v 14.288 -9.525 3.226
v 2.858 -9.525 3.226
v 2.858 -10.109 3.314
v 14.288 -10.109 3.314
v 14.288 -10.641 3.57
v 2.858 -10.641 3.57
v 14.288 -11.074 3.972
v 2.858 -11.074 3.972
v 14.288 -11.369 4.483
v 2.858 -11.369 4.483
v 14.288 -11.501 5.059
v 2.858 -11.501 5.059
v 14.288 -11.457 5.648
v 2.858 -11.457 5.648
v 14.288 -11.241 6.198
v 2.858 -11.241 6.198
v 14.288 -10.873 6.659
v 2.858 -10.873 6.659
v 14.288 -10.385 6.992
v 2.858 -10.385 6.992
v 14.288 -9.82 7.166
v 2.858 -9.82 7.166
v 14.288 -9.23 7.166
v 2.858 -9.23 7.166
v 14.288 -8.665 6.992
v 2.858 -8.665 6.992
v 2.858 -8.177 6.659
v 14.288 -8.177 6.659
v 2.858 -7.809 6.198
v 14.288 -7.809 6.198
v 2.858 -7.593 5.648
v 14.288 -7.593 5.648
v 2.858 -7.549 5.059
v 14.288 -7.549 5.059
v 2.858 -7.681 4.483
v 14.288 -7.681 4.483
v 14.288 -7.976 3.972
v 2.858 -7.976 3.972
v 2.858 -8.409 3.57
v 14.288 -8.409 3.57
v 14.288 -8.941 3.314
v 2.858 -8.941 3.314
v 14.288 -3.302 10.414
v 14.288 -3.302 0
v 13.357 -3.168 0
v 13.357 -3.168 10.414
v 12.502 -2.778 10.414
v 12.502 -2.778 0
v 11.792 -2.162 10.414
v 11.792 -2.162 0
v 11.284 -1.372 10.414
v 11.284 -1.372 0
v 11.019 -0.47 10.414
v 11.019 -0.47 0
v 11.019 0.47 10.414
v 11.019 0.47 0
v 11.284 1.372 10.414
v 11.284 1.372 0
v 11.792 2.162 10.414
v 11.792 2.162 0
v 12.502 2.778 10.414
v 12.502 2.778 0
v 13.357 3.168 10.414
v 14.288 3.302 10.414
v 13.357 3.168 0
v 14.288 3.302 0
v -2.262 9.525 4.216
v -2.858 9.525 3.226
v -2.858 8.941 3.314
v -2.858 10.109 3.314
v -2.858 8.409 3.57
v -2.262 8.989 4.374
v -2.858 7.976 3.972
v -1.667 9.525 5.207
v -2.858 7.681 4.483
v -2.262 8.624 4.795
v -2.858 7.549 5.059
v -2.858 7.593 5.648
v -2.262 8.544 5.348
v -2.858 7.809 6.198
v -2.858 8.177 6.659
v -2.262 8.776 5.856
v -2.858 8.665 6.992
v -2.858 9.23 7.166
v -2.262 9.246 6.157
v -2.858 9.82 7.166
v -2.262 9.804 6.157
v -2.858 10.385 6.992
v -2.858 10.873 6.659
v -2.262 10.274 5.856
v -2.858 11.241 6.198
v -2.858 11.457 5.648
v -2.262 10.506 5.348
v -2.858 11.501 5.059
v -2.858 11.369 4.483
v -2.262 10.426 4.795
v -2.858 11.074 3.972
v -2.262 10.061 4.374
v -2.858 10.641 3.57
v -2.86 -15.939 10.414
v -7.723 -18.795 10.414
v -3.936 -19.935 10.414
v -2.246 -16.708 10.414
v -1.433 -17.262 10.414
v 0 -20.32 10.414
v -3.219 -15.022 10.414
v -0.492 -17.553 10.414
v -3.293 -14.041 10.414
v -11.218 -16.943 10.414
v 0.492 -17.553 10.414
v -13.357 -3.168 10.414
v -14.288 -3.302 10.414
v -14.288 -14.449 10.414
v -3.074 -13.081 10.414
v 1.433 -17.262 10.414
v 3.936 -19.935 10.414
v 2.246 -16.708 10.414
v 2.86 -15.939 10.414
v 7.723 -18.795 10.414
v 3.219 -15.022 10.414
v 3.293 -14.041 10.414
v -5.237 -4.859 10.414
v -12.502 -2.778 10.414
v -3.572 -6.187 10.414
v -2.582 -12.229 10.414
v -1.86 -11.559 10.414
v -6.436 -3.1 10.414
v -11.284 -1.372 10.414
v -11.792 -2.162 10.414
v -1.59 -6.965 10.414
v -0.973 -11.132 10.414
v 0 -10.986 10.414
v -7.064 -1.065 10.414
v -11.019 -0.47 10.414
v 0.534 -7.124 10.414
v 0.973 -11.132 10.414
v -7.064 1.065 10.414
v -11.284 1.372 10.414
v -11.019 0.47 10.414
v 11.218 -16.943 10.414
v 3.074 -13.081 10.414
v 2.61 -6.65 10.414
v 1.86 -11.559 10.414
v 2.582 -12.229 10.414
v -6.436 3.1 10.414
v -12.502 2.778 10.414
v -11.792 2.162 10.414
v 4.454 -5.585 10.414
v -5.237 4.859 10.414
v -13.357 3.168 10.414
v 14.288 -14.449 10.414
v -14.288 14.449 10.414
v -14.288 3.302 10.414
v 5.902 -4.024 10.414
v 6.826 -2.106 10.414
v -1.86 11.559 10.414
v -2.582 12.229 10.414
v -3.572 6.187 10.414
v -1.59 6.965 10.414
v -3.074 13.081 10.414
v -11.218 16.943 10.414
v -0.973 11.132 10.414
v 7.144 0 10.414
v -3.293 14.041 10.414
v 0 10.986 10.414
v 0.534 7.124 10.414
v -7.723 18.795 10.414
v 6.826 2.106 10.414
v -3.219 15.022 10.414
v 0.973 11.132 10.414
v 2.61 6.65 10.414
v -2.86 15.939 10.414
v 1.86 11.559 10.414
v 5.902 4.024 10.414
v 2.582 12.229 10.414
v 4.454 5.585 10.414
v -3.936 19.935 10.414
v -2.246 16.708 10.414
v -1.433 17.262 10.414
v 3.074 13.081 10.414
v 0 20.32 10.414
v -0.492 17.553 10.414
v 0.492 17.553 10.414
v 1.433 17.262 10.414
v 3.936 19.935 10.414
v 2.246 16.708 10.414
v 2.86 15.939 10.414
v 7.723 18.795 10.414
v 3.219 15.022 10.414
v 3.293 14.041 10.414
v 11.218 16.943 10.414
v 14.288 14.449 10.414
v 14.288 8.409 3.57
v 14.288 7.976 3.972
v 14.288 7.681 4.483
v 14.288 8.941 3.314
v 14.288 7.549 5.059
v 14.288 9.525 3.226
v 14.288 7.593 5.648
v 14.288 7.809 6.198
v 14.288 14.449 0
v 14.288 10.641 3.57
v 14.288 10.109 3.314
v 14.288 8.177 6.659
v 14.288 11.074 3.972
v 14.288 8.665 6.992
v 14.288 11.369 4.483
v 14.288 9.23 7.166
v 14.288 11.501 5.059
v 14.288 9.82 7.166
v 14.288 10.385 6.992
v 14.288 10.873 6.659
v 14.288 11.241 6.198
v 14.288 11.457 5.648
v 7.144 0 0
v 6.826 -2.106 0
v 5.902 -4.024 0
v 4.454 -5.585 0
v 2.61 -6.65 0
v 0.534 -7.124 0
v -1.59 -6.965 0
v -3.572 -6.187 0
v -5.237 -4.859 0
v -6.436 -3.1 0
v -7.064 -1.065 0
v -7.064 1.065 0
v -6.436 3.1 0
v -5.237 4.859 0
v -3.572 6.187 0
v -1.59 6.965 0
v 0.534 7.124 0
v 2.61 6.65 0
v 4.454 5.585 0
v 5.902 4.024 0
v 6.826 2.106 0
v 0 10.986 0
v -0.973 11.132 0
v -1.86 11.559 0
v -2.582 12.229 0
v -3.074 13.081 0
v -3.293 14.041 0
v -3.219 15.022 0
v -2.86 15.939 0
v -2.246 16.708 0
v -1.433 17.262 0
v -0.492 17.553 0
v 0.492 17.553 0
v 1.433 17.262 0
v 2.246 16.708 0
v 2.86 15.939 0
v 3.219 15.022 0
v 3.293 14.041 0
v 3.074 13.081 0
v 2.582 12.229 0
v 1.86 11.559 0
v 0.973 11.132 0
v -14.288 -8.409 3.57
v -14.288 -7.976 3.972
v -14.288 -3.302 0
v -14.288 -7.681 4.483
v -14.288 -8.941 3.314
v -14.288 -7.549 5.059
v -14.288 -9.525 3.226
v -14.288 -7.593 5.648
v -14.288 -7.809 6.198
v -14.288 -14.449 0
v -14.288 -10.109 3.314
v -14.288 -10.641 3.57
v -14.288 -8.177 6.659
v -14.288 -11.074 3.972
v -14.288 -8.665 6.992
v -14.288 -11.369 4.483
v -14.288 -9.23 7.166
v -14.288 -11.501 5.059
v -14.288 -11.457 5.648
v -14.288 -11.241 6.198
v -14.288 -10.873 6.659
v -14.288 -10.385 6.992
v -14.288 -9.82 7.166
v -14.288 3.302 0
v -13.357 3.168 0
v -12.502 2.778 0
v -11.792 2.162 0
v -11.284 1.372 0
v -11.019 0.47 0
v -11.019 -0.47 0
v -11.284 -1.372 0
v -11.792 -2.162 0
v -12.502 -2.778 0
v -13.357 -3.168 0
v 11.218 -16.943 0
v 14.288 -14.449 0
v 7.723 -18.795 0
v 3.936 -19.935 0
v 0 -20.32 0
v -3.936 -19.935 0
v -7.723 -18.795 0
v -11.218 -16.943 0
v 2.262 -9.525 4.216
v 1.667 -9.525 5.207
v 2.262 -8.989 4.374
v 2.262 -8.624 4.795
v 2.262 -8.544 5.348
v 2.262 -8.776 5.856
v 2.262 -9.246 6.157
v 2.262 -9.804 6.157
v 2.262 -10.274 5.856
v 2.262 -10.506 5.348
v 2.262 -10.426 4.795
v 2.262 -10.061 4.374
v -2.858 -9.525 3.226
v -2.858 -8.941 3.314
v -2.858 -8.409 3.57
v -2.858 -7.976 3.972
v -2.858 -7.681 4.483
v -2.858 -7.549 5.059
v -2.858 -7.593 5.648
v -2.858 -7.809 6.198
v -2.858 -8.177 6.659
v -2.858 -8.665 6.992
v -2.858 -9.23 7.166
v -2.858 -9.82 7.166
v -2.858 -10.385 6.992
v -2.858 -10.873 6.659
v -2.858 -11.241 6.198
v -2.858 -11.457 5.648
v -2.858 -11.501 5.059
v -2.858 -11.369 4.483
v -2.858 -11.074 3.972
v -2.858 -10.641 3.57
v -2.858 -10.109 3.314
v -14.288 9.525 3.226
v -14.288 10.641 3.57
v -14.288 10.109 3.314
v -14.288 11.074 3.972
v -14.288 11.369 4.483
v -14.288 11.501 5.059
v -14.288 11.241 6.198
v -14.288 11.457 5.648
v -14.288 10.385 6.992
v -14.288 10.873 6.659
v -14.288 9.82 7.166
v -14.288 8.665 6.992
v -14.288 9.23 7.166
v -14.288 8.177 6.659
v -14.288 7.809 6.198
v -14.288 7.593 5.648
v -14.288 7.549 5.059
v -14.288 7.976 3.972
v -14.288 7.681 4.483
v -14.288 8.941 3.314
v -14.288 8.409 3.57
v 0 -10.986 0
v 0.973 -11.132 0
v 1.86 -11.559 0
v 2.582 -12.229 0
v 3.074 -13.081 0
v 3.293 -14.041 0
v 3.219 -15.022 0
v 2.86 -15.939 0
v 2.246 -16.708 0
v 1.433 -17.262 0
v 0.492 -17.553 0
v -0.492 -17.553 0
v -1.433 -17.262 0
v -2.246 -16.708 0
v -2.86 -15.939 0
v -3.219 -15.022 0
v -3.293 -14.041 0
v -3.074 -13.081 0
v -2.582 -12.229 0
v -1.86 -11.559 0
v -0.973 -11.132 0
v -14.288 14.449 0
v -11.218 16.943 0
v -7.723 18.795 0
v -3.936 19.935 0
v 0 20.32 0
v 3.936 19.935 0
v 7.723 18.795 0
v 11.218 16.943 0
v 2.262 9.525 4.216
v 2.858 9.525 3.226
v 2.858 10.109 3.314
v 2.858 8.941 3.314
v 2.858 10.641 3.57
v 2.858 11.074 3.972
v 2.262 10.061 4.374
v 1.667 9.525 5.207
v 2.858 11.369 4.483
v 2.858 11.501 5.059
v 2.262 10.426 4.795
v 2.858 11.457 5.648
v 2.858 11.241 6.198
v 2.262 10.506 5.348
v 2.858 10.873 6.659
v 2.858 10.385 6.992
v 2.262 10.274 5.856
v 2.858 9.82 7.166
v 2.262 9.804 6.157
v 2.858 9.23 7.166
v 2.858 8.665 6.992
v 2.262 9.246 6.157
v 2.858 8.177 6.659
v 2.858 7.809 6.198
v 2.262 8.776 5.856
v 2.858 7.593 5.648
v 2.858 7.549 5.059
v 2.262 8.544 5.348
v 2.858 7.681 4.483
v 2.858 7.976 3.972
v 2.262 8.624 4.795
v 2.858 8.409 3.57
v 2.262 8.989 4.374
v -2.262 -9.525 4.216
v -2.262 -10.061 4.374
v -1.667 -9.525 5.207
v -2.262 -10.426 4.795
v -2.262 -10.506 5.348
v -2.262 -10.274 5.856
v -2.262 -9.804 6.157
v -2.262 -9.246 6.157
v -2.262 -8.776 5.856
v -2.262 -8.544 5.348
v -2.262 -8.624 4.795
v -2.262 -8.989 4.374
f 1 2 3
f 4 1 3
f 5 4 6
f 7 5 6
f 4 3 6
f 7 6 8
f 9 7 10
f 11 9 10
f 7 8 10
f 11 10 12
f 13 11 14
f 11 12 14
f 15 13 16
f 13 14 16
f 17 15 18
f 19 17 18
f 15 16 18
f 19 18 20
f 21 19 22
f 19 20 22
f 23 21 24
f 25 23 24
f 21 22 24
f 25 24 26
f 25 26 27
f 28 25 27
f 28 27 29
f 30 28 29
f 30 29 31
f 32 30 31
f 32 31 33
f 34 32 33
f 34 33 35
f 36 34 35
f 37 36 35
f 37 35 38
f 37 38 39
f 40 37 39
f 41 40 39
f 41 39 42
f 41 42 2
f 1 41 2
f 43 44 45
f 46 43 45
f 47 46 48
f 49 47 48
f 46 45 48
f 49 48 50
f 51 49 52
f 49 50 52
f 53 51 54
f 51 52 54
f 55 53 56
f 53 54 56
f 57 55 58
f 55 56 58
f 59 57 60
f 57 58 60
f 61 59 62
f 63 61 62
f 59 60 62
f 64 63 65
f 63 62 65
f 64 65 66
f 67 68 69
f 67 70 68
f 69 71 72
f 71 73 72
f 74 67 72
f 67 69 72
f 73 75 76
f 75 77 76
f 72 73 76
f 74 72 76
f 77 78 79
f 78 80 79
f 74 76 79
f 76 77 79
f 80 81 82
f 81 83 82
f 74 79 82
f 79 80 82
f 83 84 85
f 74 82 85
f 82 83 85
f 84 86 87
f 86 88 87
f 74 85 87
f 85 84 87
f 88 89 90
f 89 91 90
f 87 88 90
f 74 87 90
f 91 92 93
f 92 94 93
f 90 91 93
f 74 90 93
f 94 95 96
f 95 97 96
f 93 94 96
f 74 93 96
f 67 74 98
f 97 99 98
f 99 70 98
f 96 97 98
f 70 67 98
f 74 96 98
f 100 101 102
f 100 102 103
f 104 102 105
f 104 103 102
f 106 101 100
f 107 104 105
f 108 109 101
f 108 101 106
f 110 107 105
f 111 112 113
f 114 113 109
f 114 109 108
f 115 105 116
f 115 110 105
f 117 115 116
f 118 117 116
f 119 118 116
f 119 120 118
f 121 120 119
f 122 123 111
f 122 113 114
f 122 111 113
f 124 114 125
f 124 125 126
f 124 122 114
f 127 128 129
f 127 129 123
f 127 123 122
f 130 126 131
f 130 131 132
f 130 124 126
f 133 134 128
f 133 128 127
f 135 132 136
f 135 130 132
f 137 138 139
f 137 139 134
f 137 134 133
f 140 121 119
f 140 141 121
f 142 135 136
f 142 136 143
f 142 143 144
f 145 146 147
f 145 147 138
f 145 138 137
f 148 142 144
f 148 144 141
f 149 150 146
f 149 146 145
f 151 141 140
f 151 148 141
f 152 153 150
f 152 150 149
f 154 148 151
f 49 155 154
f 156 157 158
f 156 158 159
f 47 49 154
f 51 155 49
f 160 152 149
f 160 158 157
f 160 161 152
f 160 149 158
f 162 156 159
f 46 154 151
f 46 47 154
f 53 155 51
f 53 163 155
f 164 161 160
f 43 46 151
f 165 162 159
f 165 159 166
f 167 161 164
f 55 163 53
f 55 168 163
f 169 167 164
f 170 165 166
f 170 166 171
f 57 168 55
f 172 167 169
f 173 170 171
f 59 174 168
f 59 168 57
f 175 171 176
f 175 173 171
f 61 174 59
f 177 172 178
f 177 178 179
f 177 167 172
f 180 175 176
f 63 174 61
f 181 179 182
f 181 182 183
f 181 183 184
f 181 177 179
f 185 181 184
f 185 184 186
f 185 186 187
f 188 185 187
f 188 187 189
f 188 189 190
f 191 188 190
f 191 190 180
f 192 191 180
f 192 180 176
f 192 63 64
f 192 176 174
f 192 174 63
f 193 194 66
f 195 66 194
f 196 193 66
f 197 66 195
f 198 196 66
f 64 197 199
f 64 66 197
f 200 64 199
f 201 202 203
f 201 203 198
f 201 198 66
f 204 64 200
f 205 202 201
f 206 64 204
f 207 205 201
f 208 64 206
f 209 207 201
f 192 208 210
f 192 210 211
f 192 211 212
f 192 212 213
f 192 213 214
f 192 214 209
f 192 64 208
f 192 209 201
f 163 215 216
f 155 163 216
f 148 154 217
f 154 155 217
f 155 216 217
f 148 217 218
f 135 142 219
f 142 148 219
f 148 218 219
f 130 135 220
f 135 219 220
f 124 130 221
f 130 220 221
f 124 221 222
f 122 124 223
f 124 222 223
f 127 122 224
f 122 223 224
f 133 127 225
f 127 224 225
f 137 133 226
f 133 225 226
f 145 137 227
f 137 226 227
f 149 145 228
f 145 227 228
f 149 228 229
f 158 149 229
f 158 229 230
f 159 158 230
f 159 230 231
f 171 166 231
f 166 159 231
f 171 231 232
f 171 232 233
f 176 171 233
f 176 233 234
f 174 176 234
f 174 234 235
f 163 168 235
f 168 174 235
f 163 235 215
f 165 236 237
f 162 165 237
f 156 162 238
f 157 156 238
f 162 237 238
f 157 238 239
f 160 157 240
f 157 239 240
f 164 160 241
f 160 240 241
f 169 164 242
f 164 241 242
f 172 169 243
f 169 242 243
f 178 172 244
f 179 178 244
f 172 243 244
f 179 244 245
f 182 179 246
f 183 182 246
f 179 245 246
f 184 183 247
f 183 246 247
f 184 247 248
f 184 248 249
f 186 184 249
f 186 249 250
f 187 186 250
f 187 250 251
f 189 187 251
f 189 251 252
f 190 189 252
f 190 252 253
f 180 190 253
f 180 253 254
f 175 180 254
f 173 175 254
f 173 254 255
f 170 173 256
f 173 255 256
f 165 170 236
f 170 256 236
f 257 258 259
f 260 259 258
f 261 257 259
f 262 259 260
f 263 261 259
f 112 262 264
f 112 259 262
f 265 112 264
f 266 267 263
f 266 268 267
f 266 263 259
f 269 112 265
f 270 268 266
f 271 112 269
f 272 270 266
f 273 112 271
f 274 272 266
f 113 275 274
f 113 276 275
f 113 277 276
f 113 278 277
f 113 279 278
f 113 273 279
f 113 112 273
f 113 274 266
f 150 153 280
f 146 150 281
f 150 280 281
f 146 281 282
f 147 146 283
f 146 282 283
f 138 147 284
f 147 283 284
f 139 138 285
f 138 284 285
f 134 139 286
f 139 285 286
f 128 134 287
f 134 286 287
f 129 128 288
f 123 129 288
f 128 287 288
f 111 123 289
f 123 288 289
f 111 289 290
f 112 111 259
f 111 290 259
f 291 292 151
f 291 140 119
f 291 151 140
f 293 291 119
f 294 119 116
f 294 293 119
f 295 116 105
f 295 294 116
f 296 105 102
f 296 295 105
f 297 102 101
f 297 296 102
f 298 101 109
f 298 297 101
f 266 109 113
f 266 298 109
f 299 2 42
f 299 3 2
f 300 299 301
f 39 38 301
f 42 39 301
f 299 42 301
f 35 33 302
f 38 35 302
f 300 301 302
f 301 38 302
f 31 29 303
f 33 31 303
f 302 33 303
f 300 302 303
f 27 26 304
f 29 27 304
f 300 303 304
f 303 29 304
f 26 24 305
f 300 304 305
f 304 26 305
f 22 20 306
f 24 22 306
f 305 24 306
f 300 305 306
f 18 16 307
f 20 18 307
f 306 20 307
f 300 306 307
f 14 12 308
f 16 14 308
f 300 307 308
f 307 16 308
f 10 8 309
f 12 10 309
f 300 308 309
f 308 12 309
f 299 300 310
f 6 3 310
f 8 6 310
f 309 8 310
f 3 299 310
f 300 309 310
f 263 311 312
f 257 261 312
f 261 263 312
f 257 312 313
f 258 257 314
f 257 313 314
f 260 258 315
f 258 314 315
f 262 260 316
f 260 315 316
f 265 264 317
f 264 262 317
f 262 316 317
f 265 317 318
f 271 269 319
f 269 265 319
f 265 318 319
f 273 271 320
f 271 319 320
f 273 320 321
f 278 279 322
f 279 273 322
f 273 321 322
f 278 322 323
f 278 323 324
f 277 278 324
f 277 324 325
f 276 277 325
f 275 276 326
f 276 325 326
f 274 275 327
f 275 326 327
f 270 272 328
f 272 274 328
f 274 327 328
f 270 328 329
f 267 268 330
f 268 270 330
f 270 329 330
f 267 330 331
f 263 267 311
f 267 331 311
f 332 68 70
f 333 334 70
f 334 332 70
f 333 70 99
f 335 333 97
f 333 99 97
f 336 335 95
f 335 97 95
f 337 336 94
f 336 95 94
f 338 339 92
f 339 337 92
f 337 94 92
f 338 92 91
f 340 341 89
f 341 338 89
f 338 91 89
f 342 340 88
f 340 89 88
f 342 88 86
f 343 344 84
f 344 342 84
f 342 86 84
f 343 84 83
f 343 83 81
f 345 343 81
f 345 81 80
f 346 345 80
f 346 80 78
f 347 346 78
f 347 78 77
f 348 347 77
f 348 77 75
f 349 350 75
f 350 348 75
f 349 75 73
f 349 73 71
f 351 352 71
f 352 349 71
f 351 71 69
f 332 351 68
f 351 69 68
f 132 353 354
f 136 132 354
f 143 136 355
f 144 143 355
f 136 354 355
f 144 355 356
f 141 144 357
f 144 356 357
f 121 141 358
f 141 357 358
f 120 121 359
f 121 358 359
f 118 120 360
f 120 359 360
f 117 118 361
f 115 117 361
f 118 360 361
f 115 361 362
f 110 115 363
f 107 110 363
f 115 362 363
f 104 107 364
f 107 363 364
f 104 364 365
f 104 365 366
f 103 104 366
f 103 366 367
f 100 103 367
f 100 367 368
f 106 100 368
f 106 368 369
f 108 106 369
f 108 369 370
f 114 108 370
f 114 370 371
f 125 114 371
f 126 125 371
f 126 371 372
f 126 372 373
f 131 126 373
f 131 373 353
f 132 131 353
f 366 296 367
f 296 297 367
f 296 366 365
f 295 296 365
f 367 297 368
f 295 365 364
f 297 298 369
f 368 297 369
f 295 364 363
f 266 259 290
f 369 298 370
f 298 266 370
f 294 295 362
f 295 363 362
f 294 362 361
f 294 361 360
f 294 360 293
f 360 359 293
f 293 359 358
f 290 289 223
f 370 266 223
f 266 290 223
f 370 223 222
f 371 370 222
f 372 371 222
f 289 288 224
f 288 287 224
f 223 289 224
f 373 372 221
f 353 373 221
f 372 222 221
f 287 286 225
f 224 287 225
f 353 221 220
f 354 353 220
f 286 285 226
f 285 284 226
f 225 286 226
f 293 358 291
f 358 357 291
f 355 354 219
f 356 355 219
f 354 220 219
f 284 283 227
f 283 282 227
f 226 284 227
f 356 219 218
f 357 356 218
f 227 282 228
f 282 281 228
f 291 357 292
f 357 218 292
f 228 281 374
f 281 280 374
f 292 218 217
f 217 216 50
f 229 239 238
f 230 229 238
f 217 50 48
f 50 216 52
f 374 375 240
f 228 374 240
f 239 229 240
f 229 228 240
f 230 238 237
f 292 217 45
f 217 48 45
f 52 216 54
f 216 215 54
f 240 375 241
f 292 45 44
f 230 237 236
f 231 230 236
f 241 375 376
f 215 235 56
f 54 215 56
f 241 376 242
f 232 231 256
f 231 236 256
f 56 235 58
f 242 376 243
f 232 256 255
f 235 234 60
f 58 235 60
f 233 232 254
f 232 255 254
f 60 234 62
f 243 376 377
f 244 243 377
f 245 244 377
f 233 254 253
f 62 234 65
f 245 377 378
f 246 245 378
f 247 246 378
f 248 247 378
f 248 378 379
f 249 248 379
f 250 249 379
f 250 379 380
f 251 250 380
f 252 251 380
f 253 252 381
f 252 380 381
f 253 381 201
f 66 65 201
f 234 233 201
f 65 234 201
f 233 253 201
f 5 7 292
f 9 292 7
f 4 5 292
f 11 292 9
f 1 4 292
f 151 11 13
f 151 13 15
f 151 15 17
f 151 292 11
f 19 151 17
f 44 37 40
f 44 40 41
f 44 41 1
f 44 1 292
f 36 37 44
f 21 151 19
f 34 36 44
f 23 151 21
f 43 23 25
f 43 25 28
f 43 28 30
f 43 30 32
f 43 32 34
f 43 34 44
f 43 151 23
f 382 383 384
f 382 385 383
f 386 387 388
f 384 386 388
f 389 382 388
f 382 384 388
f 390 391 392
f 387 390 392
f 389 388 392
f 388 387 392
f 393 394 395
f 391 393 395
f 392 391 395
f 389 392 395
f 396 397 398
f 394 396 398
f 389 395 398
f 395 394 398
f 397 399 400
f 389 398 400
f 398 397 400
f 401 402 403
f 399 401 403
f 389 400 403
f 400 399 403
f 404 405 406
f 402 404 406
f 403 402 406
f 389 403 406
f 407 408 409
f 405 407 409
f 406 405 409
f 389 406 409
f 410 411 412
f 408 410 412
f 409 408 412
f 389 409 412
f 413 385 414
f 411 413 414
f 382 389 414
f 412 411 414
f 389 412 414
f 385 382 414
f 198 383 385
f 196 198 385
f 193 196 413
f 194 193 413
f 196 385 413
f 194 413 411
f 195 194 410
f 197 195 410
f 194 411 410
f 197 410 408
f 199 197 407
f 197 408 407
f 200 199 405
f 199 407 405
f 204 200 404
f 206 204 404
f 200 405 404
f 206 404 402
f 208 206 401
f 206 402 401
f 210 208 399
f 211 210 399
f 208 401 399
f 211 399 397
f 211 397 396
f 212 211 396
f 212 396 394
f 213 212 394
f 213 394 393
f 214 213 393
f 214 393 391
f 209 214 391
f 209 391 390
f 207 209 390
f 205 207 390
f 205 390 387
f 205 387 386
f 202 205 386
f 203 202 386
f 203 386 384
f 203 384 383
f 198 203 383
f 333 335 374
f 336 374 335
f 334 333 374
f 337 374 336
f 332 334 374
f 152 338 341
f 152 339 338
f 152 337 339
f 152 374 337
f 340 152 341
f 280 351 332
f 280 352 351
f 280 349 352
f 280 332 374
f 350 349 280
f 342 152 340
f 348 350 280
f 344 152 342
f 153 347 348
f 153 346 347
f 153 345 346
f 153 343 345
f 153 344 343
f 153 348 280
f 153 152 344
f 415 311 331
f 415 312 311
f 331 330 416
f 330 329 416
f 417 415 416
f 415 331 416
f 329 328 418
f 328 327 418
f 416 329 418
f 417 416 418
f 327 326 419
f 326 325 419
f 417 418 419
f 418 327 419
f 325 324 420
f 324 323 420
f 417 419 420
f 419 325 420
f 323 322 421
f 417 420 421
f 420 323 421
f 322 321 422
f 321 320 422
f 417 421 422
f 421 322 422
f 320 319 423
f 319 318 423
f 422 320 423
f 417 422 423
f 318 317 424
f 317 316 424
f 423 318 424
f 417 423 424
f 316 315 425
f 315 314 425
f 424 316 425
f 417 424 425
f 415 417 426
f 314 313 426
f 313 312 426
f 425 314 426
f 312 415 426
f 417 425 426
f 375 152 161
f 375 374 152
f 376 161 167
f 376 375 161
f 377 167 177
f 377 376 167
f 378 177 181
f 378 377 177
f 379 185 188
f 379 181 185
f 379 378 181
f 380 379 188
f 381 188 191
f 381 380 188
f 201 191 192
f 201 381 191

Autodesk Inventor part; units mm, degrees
ref_plane "YZ Plane" through (0, 0, 0) normal (1, 0, 0) x (0, 1, 0)
ref_plane "XZ Plane" through (0, 0, 0) normal (0, 1, 0) x (-1, 0, 0)
ref_plane "XY Plane" through (0, 0, 0) normal (0, 0, 1) x (1, 0, 0)
sketch "Sketch1" plane through (0, 0, 0) normal (0, 0, 1) x (1, 0, 0)
  circle A0 centre (0, 0) radius 7.1437
  circle A1 centre (0, 0) radius 20.32
  dimension "d0" = 14.2875
  dimension "d1" = 40.64
extrude "Extrusion1" add sketch "Sketch1" along normal blind 10.414
thread "Thread1" size "9/16-18 UNF" class "2B" standard "ANSI Unified Screw Threads" full length
sketch "Sketch2" plane through (0, 0, 10.414) normal (0, 0, 1) x (1, 0, 0)
  point P0 (0, 0)
  point P1 (0, 14.2875)
  dimension "d6" = 14.2875
hole "Hole1" at (0, 14.2875, 10.414) direction (0, 0, -1) diameter 6.604 depth 12.2936 tip angle 118
pattern_circular "Circular Pattern1" count 4 over 360 about axis through (0, 0, 0) along (0, 0, 1) of "Hole1"
sketch "Sketch3" plane through (0, 0, 10.414) normal (0, 0, 1) x (1, 0, 0)
  line L0 (-14.2875, -29.4711) -> (14.2875, -29.4711)
  line L1 (14.2875, -29.4711) -> (14.2875, 27.3802)
  line L2 (14.2875, 27.3802) -> (-14.2875, 27.3802)
  line L3 (-14.2875, 27.3802) -> (-14.2875, -29.4711)
  line L4 (-49.0321, -62.4929) -> (63.3318, -62.4929)
  line L5 (63.3318, -62.4929) -> (63.3318, 57.2179)
  line L6 (63.3318, 57.2179) -> (-49.0321, 57.2179)
  line L7 (-49.0321, 57.2179) -> (-49.0321, -62.4929)
  point P0 (0, 0)
  dimension "d17" = 28.575
  dimension "d18" = 14.2875
extrude "Extrusion2" cut sketch "Sketch3" against normal blind 10.414
sketch "Sketch4" plane through (14.2875, 3.302, 10.414) normal (1, 0, 0) x (0, 0, -1)
  line L0 (0, -6.604) -> (10.414, -6.604) projected
  line L1 (10.414, 0) -> (10.414, -6.604) projected
  line L2 (10.414, 0) -> (0, 0) projected
  line L3 (0, -6.604) -> (0, 0) projected
  line L4 (0, -3.302) -> (10.414, -3.302)
  point P0 (5.207, 6.223)
  point P1 (5.207, -3.302)
  point P2 (5.207, -12.827)
  dimension "d21" = 9.525
  dimension "d22" = 9.525
hole "Hole2" at (14.2875, 9.525, 5.207) at (14.2875, -9.525, 5.207) direction (-1, 0, 0) diameter 3.9624 depth 11.43 tip angle 118 thread size "10-32 UNF" class "2B" standard "ANSI Unified Screw Threads"
mirror "Mirror1" about plane through (0, 0, 0) normal (1, 0, 0) of "Hole2"
equation "\"d18\" = 0.5 * d17"
equation "\"d22\" = d21"
